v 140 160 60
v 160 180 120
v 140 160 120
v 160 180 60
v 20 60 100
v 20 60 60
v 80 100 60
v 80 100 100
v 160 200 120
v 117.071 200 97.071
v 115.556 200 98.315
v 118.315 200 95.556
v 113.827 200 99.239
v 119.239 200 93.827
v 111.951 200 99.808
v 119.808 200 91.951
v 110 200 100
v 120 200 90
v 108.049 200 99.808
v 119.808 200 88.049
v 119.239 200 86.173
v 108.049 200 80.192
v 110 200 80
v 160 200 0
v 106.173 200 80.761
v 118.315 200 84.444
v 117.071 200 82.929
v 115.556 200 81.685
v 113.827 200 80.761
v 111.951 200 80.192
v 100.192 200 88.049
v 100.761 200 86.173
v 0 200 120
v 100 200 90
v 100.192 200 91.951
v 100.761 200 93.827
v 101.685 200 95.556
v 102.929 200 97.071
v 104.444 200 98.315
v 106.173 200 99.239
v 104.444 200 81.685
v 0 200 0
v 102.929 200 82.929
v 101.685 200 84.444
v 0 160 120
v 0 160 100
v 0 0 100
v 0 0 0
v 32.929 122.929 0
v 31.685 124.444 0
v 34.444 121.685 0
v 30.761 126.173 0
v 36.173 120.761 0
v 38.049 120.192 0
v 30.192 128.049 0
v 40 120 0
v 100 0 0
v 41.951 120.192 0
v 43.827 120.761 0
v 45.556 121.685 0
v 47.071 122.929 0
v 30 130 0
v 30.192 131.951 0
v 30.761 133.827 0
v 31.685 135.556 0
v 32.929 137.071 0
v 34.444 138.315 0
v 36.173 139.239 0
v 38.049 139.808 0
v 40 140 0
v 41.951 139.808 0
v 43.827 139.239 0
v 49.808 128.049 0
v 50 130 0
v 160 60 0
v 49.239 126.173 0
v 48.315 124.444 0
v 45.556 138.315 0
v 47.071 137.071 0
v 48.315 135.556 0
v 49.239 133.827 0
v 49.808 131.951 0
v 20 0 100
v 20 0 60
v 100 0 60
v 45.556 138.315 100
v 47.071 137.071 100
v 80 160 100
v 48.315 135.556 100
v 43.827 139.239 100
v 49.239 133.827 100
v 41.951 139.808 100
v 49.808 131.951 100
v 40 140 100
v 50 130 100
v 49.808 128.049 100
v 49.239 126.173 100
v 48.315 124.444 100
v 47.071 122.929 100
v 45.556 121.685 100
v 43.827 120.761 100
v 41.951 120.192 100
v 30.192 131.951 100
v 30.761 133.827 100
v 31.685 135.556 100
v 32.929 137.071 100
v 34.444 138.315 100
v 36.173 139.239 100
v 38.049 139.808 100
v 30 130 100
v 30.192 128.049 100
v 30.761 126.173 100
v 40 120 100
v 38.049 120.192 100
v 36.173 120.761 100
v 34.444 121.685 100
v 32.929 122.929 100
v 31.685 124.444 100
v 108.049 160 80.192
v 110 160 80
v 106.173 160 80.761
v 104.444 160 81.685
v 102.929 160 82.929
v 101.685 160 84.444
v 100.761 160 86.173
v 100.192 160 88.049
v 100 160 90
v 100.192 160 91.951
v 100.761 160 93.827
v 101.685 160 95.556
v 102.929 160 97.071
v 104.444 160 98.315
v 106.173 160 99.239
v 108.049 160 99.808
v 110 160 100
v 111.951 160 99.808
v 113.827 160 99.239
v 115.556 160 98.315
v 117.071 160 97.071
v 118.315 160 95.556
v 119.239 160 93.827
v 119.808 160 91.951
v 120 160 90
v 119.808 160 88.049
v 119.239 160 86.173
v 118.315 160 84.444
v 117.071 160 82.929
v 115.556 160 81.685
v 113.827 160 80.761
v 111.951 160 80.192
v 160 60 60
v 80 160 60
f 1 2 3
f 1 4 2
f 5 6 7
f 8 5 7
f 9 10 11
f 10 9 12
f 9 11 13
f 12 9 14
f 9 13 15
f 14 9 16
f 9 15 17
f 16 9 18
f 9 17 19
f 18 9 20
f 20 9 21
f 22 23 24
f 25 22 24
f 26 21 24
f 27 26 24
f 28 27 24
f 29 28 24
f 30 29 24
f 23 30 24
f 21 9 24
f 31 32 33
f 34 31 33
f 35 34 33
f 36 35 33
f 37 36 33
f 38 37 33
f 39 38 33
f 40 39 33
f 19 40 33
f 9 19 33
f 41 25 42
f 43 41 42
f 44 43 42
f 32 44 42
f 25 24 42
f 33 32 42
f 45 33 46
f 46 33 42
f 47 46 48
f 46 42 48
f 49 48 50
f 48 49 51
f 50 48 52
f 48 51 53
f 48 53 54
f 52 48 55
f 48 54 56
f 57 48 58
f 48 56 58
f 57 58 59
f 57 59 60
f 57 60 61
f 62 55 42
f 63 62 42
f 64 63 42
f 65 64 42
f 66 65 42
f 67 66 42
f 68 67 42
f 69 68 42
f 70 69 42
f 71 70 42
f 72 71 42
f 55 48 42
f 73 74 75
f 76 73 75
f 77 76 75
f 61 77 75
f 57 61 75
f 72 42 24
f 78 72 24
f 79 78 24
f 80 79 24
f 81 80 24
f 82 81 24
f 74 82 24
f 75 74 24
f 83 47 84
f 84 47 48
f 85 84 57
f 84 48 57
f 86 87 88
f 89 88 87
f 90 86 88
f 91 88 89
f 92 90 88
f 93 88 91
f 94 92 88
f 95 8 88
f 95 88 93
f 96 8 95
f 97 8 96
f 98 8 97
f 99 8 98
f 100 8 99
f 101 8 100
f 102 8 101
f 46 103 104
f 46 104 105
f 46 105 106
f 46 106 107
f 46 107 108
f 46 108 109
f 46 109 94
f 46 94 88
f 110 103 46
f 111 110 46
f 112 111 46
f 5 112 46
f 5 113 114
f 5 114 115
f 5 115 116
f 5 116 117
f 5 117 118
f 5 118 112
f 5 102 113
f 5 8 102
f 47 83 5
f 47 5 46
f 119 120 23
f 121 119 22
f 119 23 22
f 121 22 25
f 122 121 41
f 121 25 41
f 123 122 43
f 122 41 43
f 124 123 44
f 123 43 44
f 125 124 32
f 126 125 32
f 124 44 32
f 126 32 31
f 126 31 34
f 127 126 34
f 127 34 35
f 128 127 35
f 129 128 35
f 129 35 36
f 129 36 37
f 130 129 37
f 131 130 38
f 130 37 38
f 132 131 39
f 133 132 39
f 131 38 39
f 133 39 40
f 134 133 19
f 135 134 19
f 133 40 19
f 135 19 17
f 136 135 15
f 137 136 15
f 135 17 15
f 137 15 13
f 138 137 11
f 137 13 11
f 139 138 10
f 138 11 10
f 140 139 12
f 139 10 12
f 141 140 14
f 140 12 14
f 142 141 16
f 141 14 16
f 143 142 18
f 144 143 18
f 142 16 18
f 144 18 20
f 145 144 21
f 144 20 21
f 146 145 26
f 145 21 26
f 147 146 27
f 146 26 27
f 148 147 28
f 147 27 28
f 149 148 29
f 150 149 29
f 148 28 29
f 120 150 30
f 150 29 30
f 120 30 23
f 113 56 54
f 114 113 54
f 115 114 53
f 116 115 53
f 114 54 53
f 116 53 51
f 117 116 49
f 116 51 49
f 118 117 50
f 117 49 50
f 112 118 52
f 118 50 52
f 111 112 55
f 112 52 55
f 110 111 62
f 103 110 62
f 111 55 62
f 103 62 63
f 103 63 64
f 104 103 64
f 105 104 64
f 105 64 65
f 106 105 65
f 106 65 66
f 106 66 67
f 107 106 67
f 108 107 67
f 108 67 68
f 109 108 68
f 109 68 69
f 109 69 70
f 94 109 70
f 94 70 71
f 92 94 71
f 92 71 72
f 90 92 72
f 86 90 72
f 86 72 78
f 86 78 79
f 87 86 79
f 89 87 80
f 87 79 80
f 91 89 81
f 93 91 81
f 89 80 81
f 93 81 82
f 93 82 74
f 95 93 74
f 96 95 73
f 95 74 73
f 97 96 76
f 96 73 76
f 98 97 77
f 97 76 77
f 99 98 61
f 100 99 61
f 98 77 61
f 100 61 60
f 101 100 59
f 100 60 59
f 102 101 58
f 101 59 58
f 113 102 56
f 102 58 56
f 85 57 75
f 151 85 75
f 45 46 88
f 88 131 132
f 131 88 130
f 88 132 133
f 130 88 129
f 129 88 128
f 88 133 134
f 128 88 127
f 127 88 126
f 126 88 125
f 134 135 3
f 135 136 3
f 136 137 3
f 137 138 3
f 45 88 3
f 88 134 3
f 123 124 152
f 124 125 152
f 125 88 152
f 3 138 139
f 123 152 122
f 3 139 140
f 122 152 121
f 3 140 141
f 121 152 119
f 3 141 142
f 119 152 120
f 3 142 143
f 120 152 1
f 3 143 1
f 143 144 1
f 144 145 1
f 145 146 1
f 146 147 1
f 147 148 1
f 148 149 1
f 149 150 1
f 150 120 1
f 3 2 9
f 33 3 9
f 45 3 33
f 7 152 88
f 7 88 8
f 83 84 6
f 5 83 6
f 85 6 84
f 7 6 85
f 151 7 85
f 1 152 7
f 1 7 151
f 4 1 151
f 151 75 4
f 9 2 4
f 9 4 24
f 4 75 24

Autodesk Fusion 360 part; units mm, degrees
sketch "Sketch1" plane through (0, 0, 0) normal (0, 0, 1) x (1, 0, 0)
  line L0 (0, 0) -> (0, 200)
  line L1 (0, 200) -> (160, 200)
  line L2 (160, 200) -> (160, 60)
  line L3 (0, 0) -> (100, 0)
  line L4 (100, 0) -> (160, 60)
extrude "Extrude1" add sketch "Sketch1" along normal blind 60
sketch "Sketch2" plane through (0, 0, 60) normal (0, 0, 1) x (-1, 0, 0)
  line L0 (0, 0) -> (-100, 0)
  line L1 (-100, 0) -> (-160, -60)
  line L2 (-160, -60) -> (-160, -200)
  line L3 (-160, -200) -> (0, -200)
  line L4 (0, -200) -> (0, 0)
  line L5 (0, 0) -> (0, -160)
  line L6 (0, -160) -> (-80, -160)
  line L7 (-80, -160) -> (-80, -100)
  line L8 (0, 0) -> (-20, 0)
  line L9 (-20, 0) -> (-20, -60)
  line L10 (-20, -60) -> (-80, -100)
  line L11 (0, -160) -> (0, -200)
  line L12 (-160, -200) -> (-160, -180)
  line L13 (-160, -180) -> (-140, -160)
  line L14 (-140, -160) -> (-80, -160)
extrude "Extrude2" add sketch "Sketch2" along normal blind 40 contours L0 L4 L5 L6 L7 L8 L9 L10
extrude "Extrude3" add sketch "Sketch2" along normal blind 60 contours L2 L3 L4 L6 L11 L12 L13 L14
sketch "Sketch3" plane through (0, 160, 0) normal (0, -1, 0) x (1, 0, 0)
  line L0 (0, 100) -> (80, 100)
  line L1 (80, 100) -> (80, 60)
  line L2 (80, 60) -> (140, 60)
  line L3 (140, 60) -> (140, 120)
  line L4 (140, 120) -> (0, 120)
  line L5 (0, 120) -> (0, 100)
  circle A0 centre (110, 90) radius 10
  line L6 (110, 90) -> (110, 120)
  dimension "d17" = 20
hole "Hole1" at (110, 160, 90) direction (0, 1, 0) diameter 20 depth 40 tip angle 118
sketch "Sketch4" plane through (0, 0, 100) normal (0, 0, 1) x (-1, 0, 0)
  line L0 (0, 0) -> (-20, 0)
  line L1 (-20, 0) -> (-20, -60)
  line L2 (-20, -60) -> (-80, -100)
  line L3 (-80, -100) -> (-80, -160)
  line L4 (-80, -160) -> (0, -160)
  line L5 (0, -160) -> (0, 0)
hole "Hole2" at (40, 130, 100) direction (0, 0, -1) diameter 20 depth 1000 tip angle 118
